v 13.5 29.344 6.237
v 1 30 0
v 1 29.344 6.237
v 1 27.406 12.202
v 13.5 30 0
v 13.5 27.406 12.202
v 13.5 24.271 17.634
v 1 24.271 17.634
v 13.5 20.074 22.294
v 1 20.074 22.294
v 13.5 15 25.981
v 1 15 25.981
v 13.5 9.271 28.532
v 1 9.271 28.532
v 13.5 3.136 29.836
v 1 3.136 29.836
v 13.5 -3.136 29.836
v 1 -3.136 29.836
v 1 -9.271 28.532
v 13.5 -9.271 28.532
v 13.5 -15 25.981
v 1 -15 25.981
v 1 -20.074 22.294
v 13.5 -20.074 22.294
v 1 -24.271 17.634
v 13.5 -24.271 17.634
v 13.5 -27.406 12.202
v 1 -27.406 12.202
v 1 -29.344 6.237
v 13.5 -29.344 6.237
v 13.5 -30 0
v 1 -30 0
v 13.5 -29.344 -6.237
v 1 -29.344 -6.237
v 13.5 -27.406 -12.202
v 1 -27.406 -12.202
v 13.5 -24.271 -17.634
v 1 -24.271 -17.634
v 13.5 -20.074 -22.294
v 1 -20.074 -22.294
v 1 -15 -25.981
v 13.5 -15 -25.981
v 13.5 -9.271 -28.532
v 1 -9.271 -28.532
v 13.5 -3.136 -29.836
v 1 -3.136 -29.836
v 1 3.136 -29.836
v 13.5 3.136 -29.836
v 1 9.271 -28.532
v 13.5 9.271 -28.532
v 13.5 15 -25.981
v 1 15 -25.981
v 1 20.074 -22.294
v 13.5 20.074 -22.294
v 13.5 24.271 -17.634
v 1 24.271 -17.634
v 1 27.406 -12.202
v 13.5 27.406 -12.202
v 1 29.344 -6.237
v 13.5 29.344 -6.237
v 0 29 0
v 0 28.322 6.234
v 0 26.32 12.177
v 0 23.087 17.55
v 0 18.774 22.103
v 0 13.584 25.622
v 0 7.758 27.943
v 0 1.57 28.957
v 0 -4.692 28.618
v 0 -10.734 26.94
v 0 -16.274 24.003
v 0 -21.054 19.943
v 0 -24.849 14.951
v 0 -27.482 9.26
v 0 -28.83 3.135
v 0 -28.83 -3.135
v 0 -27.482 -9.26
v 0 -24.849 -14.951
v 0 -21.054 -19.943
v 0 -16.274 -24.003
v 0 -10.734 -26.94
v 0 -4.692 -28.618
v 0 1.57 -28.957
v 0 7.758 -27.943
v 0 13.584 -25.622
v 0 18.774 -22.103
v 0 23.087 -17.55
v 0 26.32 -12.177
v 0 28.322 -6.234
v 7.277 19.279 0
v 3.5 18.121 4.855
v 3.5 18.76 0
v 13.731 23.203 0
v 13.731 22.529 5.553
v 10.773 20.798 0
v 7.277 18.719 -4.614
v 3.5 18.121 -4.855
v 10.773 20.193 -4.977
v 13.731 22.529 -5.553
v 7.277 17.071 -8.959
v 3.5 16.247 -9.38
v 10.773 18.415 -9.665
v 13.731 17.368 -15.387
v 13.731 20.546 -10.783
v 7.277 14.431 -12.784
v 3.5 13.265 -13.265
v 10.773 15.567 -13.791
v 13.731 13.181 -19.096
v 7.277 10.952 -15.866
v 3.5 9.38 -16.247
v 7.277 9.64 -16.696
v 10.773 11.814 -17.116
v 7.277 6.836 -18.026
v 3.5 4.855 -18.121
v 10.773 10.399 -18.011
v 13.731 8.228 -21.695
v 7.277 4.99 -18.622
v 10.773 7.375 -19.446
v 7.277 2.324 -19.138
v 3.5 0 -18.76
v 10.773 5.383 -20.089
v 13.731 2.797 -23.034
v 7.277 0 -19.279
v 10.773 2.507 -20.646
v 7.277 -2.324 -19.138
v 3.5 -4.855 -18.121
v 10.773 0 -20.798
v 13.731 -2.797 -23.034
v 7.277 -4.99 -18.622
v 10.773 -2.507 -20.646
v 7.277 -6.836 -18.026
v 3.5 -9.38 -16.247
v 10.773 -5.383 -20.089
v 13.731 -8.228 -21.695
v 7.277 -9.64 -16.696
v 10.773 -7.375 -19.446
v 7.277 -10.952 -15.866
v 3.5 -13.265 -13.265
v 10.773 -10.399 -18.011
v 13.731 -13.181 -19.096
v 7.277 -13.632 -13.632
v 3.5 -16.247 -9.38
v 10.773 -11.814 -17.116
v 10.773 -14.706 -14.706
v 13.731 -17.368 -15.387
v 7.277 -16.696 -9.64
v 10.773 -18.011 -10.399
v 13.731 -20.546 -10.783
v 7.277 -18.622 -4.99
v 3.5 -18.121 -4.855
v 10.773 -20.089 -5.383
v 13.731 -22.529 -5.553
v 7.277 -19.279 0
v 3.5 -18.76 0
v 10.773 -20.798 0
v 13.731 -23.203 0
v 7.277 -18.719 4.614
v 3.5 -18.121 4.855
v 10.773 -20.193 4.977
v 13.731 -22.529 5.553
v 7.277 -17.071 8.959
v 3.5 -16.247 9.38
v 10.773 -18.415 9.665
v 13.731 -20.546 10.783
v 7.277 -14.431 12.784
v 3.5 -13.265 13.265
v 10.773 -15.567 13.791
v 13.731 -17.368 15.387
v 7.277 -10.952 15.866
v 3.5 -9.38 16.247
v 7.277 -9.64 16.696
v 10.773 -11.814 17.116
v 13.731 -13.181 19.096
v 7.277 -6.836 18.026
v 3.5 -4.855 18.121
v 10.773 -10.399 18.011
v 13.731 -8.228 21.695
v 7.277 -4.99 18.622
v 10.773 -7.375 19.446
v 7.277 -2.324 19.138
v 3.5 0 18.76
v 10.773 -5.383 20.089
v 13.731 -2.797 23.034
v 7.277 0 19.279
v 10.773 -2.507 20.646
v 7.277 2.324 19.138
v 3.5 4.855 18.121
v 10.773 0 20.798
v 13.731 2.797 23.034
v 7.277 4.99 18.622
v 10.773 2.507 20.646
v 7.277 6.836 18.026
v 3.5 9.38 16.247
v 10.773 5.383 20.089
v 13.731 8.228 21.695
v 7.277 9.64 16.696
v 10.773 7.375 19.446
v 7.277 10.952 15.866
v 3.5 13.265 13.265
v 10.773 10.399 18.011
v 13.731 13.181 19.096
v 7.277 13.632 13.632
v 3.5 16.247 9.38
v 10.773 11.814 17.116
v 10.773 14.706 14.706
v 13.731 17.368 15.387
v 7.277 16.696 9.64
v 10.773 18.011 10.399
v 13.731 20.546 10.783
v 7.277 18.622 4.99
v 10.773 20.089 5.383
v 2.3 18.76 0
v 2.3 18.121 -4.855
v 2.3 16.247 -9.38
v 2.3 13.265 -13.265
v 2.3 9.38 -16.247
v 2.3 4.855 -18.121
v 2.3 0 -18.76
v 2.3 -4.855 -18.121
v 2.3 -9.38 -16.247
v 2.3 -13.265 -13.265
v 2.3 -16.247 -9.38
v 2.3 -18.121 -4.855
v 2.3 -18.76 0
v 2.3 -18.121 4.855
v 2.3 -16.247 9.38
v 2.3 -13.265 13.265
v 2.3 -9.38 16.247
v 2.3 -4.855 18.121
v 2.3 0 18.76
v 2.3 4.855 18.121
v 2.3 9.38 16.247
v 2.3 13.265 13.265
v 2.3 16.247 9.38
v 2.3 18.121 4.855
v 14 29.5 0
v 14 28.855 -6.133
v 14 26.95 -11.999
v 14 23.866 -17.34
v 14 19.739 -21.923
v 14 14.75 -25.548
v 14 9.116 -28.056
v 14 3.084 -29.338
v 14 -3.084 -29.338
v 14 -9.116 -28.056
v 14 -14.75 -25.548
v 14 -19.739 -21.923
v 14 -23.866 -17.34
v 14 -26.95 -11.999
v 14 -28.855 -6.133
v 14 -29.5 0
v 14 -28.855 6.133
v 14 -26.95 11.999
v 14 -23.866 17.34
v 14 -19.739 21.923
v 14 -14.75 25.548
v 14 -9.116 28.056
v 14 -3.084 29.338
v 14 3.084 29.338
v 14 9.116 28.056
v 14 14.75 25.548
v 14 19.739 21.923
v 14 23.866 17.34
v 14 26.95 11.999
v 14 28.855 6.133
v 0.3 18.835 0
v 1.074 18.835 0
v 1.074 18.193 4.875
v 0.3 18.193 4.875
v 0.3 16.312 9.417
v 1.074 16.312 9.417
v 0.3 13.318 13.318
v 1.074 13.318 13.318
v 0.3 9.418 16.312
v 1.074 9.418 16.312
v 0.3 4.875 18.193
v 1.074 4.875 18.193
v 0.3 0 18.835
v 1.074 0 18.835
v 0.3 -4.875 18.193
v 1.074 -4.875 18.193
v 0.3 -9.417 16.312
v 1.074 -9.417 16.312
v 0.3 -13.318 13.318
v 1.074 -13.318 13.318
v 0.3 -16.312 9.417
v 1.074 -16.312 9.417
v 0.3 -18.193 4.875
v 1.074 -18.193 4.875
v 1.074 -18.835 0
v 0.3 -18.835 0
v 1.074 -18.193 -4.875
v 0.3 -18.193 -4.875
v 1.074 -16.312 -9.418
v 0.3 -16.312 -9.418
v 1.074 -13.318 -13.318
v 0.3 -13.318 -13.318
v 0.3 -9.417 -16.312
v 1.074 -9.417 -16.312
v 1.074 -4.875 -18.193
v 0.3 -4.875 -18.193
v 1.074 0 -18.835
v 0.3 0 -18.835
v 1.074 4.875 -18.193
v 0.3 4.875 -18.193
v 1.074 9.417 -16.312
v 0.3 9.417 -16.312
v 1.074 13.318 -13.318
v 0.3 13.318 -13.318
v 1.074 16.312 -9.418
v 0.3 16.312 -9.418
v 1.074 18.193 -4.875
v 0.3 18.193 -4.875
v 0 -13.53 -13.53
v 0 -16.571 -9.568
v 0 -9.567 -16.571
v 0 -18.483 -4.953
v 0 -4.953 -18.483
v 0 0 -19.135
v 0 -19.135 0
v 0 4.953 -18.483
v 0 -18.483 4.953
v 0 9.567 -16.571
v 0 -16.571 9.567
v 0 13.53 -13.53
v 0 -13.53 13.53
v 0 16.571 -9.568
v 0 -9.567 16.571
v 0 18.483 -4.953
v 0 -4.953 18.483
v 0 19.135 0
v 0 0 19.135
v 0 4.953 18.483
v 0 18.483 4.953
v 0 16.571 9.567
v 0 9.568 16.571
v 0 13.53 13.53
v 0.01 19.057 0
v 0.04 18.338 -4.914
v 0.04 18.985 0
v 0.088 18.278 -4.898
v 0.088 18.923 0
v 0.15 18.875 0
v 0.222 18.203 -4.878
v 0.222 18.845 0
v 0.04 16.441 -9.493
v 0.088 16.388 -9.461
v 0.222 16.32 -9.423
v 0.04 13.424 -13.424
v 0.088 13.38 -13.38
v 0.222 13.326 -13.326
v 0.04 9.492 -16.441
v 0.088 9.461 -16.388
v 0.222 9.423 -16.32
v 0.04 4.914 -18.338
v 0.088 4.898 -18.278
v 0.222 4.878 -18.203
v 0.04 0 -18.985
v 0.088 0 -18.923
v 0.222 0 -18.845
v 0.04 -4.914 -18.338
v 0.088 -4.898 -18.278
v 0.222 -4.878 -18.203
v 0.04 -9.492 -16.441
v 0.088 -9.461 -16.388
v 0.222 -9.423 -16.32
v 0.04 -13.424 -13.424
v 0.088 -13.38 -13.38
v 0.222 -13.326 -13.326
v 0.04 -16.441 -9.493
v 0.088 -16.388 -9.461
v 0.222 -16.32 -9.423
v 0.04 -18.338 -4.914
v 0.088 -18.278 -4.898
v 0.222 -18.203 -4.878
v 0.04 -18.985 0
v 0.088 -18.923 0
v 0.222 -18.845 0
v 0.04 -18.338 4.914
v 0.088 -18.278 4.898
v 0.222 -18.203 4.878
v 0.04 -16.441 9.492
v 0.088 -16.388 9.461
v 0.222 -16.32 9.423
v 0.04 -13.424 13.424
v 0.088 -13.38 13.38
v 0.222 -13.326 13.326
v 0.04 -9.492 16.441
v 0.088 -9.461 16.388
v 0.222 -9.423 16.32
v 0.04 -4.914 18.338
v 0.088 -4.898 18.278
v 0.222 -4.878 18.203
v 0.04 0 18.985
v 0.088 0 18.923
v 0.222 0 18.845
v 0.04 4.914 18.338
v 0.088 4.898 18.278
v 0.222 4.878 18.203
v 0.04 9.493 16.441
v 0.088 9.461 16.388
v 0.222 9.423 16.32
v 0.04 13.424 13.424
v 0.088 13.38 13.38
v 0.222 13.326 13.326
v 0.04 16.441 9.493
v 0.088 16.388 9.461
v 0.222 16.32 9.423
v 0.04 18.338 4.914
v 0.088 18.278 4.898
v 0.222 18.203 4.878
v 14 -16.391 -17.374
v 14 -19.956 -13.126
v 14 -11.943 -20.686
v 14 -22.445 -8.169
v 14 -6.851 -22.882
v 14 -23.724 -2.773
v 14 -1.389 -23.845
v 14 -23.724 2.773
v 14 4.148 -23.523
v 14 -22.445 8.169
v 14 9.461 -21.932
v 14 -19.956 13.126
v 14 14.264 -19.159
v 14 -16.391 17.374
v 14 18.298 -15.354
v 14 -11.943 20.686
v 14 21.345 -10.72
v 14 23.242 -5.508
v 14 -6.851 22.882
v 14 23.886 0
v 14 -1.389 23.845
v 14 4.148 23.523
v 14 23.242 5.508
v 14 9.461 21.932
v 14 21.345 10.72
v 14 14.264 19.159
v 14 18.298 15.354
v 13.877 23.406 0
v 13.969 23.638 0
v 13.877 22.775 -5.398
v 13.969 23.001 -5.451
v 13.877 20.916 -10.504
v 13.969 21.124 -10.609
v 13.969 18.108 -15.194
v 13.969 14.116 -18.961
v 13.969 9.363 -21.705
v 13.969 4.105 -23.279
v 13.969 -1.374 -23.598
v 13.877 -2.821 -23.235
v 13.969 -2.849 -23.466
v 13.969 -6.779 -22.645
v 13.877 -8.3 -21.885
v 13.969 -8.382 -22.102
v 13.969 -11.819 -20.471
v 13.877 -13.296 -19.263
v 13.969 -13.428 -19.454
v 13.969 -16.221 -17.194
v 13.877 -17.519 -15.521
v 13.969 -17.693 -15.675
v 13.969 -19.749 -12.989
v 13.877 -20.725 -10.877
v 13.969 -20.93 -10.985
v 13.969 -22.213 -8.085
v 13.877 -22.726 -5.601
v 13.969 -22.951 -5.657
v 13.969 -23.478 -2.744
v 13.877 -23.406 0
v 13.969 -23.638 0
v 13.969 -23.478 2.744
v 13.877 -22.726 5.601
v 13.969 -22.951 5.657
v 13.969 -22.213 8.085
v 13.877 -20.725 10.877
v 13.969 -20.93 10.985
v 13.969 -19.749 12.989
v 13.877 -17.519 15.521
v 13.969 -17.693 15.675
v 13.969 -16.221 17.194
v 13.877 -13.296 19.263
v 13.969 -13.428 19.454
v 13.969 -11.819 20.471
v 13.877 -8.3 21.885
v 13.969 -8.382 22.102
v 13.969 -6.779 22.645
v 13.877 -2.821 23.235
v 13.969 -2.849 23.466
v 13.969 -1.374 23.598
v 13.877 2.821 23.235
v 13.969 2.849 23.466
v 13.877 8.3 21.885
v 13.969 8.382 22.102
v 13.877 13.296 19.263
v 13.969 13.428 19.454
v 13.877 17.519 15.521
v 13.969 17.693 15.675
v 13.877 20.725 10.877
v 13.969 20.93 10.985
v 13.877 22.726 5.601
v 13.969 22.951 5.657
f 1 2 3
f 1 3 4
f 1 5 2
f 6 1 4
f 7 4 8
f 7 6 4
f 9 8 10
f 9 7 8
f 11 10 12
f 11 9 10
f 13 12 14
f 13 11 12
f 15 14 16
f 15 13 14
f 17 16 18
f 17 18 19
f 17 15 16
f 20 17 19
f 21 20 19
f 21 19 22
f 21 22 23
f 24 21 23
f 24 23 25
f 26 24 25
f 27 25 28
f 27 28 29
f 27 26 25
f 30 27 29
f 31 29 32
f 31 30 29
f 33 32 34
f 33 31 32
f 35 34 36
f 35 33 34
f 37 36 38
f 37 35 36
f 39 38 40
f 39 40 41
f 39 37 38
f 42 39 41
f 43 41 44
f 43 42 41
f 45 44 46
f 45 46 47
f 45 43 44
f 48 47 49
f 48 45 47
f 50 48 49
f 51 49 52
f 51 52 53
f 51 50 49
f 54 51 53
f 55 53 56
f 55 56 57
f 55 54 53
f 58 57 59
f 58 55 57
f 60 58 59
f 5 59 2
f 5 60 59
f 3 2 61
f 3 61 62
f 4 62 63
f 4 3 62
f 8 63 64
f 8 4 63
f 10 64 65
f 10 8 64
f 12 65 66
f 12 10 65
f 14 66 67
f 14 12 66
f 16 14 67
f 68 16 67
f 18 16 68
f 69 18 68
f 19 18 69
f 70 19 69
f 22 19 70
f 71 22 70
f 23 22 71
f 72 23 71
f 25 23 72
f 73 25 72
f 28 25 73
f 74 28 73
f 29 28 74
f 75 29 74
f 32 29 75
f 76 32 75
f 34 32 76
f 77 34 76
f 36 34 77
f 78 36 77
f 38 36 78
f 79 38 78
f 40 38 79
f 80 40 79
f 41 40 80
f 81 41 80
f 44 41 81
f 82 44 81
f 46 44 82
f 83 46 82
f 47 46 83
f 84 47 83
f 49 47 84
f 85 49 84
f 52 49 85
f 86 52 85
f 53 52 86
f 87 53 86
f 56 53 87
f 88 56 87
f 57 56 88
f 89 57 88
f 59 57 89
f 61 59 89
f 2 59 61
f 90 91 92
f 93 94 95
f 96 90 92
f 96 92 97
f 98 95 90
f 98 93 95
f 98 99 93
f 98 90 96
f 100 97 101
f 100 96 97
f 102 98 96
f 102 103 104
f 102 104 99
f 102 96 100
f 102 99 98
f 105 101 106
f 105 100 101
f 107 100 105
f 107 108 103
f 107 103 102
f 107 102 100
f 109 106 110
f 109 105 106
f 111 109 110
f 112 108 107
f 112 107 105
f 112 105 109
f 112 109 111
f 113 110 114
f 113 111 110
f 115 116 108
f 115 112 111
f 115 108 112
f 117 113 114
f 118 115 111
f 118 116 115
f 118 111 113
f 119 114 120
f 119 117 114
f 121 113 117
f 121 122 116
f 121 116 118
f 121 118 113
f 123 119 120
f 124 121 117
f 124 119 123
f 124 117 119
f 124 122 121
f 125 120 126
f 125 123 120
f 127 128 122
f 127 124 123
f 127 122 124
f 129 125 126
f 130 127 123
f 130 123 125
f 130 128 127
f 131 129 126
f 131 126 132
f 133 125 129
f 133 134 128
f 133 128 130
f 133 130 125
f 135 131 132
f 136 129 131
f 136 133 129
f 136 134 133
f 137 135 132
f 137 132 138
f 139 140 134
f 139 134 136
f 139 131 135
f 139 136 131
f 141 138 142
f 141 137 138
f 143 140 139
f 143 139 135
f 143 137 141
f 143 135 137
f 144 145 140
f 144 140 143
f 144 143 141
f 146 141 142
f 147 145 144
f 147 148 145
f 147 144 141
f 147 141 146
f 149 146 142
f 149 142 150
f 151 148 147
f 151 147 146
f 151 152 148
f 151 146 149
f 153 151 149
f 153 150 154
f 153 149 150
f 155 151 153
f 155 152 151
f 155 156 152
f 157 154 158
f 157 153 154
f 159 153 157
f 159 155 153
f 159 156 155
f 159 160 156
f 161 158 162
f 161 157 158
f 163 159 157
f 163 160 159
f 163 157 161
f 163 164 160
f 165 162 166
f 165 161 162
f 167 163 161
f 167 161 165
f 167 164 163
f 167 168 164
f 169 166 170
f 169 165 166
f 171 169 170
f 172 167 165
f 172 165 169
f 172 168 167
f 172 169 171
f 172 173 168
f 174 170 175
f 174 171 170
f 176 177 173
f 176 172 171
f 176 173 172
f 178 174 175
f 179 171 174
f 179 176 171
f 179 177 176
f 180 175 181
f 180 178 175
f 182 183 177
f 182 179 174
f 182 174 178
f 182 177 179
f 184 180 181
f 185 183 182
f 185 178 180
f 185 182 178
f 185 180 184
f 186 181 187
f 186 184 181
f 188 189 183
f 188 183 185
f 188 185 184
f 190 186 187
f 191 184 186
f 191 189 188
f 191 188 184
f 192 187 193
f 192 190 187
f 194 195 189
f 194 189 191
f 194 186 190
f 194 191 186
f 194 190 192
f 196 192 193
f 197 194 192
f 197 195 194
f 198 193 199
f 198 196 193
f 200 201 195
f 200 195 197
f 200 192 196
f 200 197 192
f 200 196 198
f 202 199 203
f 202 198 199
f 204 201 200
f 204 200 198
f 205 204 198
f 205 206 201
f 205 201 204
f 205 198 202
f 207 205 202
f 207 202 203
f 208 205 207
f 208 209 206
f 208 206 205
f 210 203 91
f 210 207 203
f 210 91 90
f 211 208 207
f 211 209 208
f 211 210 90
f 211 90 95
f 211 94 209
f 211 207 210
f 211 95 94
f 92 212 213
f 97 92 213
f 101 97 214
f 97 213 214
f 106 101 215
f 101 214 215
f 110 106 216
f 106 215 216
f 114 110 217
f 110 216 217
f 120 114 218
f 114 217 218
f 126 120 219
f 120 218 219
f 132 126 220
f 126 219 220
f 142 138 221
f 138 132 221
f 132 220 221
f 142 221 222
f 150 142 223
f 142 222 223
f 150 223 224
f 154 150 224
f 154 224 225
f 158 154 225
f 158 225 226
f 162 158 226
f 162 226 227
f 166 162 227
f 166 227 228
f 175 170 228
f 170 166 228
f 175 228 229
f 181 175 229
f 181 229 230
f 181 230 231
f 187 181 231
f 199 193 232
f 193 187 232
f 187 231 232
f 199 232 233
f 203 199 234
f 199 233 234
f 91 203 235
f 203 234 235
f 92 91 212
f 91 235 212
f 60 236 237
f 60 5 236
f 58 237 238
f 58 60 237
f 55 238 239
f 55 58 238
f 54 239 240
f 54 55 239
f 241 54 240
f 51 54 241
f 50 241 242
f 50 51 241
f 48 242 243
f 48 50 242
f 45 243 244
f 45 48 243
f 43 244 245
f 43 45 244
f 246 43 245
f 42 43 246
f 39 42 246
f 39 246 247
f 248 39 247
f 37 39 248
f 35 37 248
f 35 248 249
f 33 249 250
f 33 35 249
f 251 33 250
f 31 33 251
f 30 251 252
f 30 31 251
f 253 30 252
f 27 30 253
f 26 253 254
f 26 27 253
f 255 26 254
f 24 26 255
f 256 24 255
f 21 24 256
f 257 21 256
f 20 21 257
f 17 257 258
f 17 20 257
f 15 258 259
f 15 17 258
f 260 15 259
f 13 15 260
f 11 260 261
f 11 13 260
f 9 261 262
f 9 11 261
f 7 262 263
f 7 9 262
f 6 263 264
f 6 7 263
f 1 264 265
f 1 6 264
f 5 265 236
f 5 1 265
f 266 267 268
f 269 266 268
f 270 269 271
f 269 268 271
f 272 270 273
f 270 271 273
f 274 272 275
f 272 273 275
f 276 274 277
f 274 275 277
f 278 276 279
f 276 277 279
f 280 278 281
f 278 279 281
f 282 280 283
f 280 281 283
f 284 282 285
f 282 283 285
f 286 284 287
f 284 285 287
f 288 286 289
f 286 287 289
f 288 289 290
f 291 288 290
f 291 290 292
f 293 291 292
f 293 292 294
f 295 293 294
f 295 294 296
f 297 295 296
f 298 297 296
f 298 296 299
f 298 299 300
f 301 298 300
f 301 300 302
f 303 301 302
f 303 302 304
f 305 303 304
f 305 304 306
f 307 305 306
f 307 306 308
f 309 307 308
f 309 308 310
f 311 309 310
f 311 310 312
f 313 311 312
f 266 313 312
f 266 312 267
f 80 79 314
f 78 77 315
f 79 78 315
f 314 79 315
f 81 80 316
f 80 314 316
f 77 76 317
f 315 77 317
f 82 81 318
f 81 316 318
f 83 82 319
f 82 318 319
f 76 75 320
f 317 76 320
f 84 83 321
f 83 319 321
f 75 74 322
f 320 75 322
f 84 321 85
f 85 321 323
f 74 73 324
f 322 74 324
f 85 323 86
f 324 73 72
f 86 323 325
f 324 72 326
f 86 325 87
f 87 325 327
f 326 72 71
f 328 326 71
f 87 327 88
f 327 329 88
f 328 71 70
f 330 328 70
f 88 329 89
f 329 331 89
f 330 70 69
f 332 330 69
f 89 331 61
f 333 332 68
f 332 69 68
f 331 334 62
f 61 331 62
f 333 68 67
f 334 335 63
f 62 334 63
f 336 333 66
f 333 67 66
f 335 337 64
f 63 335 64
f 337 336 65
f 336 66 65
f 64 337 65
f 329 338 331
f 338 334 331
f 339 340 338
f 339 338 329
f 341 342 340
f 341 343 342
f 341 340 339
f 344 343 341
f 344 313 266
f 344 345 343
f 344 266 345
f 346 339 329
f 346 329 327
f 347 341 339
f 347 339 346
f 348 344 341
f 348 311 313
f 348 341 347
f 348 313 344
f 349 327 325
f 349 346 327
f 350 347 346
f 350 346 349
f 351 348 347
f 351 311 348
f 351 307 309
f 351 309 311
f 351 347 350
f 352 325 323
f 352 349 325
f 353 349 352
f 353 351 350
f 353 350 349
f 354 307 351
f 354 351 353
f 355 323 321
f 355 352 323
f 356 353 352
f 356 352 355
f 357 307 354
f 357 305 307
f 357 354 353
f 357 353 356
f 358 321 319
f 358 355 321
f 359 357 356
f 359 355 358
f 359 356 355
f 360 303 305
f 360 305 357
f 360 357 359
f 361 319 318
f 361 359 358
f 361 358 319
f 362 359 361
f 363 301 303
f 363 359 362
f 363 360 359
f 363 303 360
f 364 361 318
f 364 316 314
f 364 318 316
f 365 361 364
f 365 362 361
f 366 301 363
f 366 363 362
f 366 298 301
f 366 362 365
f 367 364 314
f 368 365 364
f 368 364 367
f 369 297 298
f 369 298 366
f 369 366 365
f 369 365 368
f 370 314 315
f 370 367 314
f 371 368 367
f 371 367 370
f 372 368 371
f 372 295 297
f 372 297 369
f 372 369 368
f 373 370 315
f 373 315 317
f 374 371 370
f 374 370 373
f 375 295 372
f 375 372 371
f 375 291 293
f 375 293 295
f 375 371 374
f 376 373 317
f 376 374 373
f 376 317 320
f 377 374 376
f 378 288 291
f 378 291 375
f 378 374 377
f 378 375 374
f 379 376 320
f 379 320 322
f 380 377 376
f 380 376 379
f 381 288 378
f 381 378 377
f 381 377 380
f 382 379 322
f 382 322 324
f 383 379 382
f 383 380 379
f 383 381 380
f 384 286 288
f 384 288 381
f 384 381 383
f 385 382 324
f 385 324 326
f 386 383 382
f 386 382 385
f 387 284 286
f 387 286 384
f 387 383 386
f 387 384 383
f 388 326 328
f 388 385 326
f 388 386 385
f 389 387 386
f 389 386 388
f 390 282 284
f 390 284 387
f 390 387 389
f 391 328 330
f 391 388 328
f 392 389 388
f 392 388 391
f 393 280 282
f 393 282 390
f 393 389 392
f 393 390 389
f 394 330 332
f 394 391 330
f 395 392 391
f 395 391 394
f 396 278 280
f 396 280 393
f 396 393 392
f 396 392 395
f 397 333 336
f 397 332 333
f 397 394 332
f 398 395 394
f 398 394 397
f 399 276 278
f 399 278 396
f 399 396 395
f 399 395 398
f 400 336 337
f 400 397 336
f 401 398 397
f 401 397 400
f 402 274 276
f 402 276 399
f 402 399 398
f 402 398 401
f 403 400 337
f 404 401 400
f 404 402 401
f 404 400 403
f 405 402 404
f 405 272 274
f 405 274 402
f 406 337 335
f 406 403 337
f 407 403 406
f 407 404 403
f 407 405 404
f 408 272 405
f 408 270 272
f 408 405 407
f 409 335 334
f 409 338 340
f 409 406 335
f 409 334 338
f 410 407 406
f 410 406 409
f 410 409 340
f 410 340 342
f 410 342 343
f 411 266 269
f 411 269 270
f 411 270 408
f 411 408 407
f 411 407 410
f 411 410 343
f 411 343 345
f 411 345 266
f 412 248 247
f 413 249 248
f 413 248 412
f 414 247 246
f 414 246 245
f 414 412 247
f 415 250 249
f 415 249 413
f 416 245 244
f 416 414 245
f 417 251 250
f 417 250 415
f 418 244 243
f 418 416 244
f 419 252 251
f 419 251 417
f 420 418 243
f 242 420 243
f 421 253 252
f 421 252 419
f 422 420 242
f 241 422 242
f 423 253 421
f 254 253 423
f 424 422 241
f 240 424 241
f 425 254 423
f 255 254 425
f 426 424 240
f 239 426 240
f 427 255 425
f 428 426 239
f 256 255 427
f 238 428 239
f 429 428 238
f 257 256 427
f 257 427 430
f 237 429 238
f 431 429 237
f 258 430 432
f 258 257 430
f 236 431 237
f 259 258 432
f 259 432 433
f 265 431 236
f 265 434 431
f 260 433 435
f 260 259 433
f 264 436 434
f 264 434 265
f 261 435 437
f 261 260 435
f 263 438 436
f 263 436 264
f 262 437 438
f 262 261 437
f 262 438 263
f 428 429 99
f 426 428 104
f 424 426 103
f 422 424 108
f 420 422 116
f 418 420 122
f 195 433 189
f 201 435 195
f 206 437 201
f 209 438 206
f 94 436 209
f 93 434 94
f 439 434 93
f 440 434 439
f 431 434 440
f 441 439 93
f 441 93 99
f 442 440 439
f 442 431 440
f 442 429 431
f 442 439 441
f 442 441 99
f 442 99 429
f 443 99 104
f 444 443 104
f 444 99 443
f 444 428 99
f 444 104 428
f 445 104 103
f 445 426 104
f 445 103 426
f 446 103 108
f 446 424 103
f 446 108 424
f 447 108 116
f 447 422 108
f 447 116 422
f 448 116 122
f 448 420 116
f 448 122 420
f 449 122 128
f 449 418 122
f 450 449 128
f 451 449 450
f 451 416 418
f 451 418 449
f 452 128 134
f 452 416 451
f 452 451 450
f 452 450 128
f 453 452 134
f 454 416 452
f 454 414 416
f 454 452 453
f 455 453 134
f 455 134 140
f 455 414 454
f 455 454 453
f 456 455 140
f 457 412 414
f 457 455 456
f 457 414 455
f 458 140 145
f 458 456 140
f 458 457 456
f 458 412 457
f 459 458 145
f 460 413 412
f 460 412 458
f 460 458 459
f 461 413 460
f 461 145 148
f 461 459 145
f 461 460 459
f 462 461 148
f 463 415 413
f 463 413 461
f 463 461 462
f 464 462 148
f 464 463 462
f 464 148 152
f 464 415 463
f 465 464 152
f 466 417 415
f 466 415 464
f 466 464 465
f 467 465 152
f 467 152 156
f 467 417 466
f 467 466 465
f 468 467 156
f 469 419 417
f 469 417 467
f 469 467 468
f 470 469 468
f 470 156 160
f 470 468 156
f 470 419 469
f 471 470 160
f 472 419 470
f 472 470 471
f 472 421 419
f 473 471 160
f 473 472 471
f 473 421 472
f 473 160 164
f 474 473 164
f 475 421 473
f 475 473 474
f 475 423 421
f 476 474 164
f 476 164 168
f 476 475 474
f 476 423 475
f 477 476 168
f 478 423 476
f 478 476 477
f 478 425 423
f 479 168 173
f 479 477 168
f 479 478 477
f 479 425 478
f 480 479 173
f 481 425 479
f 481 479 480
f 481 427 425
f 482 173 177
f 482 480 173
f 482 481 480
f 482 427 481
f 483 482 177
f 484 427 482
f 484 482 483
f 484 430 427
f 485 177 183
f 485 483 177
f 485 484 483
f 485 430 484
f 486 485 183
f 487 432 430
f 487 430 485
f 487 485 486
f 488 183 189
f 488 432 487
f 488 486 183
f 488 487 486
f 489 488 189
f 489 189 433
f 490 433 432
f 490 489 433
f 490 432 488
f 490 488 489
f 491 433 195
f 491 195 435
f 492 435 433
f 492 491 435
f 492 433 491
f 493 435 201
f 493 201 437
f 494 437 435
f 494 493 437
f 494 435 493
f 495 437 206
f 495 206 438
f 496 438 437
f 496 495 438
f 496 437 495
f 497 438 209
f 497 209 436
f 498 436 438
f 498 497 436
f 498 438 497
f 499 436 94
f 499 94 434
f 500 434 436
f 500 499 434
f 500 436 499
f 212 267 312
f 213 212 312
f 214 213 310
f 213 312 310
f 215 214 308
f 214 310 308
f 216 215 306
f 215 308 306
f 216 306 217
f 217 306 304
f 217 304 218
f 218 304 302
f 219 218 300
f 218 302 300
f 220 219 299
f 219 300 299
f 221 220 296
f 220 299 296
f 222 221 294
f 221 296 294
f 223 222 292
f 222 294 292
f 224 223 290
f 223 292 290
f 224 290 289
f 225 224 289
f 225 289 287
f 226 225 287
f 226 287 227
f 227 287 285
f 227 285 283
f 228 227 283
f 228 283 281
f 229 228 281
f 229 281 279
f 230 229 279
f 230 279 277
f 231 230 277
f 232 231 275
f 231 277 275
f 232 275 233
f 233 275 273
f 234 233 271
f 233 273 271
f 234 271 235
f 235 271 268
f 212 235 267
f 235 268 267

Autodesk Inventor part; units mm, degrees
ref_plane "YZ Plane" through (0, 0, 0) normal (1, 0, 0) x (0, 1, 0)
ref_plane "XZ Plane" through (0, 0, 0) normal (0, 1, 0) x (-1, 0, 0)
ref_plane "XY Plane" through (0, 0, 0) normal (0, 0, 1) x (1, 0, 0)
sketch "Náčrt1" plane through (0, 0, 0) normal (0, 0, 1) x (1, 0, 0)
  line L0 (0, 0) -> (14.198, 0)
  line L1 (0, 19.135) -> (0, 30)
  line L2 (0, 30) -> (14, 30)
  line L3 (14, 30) -> (14, 23.8859)
  line L4 (3.5, 18.76) -> (2.3, 18.76)
  arc A0 (3.5, 18.76) -> (13.7308, 23.2033) centre (3.5, 32.76) ccw
  arc A1 (13.7308, 23.2033) -> (14, 23.8859) centre (13, 23.8859) ccw
  line L5 (0.3, 18.835) -> (1.0738, 18.835)
  line L6 (1.0738, 18.835) -> (2.3, 18.76)
  arc A2 (0, 19.135) -> (0.3, 18.835) centre (0.3, 19.135) ccw
  point P0 (0, 18.835)
  dimension "d0" = 60
  dimension "d1" = 37.52
  dimension "d4" = 14
  dimension "d18" = 1
  dimension "d21" = 14
  dimension "d25" = 10.5
  dimension "d26" = 1.2
  dimension "d27" = 37.67
  dimension "d28" = 3.5
  dimension "d29" = 0.3
  dimension "d32" = 5.1259
revolve "Rotace1" add sketch "Náčrt1" angle 360 about axis through (0, 0, 0) along (1, 0, 0)
chamfer "Zkosení1" distance 1 angle 45 1 edges at (0, -30, 0)
chamfer "Zkosení2" distance 0.5 angle 45 1 edges at (14, -30, 0)
equation "\"Rozmer_B\" = 0"
equation "\"Rozmer_C\" = 0"
equation "\"Rozmer_D\" = d21"
properties part number "NA-45-h-Crown-129" material "19 436.4"
